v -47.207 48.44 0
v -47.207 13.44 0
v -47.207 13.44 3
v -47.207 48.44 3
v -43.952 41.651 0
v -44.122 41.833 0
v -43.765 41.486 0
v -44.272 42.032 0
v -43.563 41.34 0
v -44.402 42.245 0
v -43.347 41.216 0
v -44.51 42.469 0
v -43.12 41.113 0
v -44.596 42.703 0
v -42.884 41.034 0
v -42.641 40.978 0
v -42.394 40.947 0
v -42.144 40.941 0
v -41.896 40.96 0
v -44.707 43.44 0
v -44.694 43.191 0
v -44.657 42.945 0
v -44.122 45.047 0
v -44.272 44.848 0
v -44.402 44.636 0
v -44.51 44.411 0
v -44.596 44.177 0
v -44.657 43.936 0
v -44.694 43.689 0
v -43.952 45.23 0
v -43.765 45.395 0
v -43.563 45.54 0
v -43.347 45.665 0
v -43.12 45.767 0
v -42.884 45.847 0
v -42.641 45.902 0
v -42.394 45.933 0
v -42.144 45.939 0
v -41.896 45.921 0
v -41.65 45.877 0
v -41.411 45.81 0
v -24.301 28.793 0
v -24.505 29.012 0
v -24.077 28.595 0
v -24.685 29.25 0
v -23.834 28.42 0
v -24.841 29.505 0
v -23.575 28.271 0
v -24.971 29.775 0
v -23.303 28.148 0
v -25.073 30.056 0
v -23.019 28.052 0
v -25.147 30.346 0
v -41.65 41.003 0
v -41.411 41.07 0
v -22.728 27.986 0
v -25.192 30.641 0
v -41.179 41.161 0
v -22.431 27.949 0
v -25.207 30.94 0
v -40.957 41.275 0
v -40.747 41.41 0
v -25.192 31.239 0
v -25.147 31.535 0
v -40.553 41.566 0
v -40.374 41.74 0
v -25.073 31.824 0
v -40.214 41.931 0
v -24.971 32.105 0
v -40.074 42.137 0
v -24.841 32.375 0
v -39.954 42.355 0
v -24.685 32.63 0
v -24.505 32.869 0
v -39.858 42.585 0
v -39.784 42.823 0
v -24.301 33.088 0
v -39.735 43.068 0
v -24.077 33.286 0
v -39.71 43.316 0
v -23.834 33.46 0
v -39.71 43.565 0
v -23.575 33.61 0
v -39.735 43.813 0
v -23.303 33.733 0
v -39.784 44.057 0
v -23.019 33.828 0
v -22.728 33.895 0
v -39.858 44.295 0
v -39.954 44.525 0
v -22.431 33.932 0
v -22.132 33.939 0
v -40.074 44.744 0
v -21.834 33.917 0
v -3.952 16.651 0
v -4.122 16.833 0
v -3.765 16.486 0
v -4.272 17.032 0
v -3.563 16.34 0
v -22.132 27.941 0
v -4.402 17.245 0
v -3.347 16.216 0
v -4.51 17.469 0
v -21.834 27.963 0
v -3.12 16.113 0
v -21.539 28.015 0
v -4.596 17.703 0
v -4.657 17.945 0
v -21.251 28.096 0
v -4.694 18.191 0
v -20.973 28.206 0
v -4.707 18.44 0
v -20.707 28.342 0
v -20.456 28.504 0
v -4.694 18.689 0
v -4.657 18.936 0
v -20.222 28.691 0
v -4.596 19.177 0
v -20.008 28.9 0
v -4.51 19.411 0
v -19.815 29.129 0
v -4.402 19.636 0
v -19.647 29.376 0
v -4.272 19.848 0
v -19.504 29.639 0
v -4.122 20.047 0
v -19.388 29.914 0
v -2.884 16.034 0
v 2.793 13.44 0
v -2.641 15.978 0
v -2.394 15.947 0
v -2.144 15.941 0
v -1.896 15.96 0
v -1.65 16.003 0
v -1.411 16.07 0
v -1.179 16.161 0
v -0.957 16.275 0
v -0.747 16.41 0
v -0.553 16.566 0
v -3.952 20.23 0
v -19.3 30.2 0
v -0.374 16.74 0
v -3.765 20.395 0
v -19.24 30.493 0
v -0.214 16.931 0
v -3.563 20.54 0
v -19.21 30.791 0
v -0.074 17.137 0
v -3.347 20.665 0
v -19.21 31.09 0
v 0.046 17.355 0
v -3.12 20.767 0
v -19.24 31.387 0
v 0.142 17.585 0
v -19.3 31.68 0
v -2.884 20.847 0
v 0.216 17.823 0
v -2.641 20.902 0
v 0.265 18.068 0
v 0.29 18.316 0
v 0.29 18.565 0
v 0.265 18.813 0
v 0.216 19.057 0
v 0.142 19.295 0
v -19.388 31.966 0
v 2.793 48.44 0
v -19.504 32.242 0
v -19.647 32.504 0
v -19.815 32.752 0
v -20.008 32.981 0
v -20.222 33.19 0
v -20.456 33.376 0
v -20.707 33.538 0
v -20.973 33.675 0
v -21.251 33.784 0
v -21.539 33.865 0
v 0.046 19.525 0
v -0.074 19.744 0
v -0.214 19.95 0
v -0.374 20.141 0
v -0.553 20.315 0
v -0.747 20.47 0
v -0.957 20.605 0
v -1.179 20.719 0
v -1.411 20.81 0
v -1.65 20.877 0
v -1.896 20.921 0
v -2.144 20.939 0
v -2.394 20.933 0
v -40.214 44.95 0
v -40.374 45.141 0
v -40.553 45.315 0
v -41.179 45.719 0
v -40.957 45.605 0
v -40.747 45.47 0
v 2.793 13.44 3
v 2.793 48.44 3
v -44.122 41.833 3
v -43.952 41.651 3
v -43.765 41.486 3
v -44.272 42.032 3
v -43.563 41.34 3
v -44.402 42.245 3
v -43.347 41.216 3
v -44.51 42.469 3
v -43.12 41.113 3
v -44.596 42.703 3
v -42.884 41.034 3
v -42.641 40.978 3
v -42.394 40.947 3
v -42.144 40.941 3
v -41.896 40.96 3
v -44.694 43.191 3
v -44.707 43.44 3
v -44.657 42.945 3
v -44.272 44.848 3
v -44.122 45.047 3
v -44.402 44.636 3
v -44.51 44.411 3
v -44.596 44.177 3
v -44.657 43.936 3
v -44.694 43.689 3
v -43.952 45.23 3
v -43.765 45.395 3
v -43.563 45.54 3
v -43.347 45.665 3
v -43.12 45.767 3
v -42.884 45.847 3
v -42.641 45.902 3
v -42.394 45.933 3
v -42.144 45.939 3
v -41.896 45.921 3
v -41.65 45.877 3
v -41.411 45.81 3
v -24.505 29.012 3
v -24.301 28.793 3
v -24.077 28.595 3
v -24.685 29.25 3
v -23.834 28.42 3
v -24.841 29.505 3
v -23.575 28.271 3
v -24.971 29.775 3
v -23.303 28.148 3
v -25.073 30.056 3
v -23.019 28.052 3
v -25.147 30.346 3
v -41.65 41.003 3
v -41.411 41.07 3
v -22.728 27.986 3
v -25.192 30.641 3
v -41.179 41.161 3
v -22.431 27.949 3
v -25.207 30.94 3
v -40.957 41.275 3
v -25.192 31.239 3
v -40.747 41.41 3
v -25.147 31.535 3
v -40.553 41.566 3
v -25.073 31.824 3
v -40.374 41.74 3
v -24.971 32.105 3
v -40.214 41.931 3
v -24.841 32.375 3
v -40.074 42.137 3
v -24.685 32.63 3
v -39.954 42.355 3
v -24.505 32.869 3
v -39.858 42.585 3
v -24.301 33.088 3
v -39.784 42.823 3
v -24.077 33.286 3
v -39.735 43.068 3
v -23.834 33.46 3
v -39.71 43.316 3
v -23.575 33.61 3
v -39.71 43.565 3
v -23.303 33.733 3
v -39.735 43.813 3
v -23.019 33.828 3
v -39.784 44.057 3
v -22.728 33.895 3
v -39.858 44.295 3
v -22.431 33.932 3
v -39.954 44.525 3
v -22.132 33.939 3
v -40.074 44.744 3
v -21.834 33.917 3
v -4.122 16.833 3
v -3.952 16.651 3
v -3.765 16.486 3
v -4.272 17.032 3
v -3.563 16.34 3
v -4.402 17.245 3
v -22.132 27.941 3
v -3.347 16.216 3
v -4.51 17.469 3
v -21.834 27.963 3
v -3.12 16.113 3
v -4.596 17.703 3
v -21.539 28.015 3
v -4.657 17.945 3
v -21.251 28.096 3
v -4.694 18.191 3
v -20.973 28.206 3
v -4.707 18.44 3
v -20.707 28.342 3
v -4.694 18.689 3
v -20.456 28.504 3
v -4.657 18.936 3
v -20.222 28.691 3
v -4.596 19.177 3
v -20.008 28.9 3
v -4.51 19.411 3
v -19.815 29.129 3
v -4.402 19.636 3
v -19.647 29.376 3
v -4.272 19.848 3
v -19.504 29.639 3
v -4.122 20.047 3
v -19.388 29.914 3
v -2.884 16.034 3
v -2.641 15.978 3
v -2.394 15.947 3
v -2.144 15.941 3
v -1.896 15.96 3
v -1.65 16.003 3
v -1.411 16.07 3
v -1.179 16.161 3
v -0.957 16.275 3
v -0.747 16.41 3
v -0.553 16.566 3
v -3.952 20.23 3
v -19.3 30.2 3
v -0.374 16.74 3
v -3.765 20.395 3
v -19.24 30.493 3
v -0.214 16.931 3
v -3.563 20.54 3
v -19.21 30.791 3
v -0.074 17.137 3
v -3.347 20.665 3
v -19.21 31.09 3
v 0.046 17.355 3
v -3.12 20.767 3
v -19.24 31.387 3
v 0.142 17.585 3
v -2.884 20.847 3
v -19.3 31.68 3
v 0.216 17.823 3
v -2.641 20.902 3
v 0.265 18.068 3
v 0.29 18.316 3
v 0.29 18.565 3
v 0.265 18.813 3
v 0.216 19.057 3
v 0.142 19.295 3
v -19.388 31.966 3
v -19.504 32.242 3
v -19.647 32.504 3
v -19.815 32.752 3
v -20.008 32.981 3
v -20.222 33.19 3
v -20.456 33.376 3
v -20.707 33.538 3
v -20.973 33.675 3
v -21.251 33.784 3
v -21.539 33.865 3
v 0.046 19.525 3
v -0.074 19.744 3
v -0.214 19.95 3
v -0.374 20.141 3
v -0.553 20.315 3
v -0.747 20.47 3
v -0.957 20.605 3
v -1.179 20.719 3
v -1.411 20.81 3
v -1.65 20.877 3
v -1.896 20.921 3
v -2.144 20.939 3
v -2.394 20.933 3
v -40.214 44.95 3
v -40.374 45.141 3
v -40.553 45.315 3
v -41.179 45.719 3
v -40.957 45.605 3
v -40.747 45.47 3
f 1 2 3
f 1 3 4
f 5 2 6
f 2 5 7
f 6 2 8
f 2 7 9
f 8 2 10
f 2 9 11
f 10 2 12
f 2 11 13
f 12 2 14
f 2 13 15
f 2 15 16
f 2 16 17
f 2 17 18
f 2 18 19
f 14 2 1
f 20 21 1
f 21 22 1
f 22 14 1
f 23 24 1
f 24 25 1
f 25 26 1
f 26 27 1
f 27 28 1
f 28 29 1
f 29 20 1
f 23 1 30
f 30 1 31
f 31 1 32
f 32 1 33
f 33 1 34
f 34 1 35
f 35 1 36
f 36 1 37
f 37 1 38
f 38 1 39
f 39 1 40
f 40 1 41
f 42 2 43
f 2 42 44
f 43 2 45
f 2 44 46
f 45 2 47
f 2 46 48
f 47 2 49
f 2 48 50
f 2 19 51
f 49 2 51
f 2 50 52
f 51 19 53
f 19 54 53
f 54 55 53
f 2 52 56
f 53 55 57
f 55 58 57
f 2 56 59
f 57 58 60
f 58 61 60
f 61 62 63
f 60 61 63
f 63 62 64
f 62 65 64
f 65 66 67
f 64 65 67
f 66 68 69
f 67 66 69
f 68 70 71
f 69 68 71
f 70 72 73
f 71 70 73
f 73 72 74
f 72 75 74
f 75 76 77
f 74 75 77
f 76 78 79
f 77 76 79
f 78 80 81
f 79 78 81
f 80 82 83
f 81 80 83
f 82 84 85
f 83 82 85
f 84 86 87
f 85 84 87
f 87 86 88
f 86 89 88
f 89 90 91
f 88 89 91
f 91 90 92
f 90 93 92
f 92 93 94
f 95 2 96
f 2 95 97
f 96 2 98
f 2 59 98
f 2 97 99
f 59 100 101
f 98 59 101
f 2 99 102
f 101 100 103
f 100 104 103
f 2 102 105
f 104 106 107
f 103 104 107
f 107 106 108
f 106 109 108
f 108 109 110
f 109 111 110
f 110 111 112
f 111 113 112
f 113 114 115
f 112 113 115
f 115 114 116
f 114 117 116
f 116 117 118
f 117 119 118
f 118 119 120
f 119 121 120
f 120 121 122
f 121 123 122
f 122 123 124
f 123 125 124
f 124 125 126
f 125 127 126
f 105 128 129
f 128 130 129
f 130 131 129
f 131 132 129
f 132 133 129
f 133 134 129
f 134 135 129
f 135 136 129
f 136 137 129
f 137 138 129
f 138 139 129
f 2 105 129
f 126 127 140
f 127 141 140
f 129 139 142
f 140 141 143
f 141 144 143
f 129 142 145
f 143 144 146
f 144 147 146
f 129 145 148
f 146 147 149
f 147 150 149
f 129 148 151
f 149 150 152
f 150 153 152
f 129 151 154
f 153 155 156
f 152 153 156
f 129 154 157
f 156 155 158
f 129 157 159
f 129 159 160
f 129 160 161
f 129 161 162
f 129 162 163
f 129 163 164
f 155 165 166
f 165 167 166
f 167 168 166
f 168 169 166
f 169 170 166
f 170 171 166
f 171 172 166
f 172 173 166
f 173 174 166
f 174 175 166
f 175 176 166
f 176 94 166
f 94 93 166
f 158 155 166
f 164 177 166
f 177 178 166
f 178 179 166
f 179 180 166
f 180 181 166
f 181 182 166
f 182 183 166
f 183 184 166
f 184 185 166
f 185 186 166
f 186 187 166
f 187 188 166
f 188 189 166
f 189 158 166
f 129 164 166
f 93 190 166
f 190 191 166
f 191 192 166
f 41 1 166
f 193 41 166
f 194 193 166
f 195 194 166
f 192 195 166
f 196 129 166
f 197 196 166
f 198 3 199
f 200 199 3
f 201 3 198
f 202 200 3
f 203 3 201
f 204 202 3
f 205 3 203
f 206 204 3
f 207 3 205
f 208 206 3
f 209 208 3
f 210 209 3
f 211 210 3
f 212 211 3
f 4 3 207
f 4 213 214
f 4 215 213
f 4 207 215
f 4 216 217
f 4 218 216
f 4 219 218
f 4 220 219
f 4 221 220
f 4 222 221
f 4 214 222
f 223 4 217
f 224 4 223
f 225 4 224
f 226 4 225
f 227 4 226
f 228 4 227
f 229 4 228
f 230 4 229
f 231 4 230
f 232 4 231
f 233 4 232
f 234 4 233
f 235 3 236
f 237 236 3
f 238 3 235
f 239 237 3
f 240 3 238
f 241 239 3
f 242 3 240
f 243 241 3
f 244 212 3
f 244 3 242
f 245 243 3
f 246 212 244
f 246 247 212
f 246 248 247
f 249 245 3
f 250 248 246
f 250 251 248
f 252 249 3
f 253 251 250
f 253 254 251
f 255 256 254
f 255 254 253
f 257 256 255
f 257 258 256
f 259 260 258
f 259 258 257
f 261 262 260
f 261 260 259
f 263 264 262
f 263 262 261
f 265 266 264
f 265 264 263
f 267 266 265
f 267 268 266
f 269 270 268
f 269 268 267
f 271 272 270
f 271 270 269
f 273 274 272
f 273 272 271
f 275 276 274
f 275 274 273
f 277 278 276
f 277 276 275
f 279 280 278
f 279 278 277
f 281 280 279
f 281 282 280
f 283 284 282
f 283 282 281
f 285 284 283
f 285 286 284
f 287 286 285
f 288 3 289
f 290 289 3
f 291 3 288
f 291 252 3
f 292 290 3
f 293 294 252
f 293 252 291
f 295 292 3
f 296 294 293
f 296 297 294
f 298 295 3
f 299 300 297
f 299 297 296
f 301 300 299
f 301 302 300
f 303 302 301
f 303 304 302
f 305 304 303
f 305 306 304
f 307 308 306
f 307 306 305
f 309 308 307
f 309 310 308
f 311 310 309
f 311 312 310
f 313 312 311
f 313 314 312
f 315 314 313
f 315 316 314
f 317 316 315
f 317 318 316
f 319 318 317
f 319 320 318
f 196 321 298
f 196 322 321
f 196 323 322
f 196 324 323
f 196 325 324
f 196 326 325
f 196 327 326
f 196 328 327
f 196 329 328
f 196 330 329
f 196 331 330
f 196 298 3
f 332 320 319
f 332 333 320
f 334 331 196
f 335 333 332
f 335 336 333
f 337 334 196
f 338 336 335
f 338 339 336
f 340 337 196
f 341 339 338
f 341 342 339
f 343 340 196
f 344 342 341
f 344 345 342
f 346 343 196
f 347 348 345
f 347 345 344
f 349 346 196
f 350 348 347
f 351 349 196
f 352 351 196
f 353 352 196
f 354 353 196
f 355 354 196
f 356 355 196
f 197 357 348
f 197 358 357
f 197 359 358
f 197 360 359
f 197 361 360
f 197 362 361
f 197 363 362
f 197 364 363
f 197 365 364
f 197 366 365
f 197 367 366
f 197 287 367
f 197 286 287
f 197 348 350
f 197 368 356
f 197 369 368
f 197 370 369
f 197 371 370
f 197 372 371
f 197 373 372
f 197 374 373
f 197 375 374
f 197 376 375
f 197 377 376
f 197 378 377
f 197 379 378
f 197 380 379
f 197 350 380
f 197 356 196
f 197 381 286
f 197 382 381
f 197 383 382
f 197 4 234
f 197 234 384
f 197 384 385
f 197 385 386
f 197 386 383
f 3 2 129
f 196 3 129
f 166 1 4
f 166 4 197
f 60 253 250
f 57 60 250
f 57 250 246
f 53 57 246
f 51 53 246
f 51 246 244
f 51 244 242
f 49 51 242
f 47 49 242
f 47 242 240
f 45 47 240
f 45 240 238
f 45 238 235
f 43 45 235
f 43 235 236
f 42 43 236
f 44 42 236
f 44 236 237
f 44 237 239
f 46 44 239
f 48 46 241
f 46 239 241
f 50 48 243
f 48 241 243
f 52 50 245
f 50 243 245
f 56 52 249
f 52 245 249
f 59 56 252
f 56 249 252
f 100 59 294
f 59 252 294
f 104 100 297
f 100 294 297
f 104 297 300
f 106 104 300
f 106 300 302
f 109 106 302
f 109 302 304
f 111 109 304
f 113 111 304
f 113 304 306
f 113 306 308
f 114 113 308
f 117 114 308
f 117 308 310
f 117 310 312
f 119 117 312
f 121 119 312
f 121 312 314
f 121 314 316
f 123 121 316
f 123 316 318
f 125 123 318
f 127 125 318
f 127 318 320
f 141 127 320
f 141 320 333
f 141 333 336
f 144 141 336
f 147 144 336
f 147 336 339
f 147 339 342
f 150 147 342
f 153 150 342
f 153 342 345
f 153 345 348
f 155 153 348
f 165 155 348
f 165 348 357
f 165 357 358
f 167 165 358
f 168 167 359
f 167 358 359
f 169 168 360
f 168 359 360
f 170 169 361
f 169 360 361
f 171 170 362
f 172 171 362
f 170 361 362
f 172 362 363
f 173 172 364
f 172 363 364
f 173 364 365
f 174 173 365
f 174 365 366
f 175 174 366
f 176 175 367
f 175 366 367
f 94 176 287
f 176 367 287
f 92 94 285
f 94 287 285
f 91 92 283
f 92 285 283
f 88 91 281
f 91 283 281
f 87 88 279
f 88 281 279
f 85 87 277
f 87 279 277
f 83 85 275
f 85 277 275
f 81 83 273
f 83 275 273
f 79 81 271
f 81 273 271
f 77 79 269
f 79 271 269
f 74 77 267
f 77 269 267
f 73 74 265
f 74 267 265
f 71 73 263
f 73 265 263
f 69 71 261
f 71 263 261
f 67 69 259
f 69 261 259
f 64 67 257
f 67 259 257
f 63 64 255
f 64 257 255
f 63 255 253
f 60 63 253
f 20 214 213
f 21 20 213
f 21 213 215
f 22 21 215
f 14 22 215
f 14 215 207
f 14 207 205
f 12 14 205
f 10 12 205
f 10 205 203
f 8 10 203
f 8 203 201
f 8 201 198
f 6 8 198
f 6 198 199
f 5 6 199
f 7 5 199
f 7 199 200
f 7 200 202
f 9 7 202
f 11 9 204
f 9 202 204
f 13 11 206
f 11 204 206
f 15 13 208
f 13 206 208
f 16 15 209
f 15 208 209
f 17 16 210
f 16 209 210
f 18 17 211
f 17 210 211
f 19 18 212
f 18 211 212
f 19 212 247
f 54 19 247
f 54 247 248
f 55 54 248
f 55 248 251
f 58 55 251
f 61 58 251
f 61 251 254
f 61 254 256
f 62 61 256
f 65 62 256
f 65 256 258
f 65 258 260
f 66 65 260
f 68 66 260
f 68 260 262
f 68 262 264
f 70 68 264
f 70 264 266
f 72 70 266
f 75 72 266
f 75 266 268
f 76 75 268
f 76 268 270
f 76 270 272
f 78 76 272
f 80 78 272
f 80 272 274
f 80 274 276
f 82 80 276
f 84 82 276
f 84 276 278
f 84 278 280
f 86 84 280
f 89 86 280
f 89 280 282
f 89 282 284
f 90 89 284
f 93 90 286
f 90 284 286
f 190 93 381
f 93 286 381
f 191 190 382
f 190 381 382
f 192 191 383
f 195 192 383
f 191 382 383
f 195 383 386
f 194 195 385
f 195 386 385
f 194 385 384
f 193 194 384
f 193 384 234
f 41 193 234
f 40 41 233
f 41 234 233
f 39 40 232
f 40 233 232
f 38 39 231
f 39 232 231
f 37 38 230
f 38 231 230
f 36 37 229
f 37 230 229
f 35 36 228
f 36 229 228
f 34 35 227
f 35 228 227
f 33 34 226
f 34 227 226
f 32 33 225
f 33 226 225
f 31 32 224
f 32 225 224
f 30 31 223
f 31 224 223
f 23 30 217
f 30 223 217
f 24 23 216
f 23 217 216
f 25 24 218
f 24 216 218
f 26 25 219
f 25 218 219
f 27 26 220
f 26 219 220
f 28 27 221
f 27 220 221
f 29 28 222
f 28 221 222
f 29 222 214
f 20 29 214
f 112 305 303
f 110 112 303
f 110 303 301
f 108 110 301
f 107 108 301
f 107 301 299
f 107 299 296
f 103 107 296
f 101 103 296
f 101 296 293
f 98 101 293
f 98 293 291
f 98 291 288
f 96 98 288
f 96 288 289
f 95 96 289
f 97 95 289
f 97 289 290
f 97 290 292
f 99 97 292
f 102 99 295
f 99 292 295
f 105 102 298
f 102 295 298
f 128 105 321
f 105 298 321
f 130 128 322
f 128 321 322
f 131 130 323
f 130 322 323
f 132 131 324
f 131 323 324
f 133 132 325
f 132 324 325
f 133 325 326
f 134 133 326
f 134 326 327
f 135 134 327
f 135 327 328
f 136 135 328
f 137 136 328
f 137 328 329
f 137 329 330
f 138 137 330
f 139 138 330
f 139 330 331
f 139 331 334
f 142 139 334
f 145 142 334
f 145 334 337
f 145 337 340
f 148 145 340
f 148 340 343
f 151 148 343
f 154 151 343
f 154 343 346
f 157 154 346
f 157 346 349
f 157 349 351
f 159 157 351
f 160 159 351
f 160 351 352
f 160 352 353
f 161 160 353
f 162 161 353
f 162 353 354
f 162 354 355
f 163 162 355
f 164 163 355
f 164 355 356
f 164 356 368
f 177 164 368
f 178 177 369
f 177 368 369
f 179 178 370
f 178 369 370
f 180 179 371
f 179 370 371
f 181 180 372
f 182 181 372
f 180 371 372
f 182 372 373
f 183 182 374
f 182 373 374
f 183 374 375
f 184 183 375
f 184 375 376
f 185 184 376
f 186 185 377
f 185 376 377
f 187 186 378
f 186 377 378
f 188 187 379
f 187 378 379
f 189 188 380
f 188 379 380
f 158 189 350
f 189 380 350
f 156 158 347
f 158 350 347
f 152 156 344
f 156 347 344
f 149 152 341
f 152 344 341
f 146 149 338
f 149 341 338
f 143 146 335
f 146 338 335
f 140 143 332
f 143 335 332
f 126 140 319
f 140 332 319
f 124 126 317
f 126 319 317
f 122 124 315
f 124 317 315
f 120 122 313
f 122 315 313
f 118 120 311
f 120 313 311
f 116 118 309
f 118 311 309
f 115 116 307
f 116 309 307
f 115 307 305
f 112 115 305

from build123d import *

# Parameters (mm, degrees)
F0_W     = 50
F0_H     = 35
F1_DEPTH = 3
F2_D     = 6
F3_D     = 5
F4_D     = 5


with BuildPart() as f1:
    # F0 (on Top) → F1 (new body)
    with BuildSketch(Plane.XY):
        with Locations((-22.2067534924, 30.9401798017)):
            Rectangle(F0_W, F0_H)
    extrude(amount=F1_DEPTH)

    # F2 (through all)
    with Locations(Plane(origin=(0, 0, 0), x_dir=(1, 0, 0), z_dir=(0, 0, -1))):
        with Locations((-22.2067534924, -30.9401798017)):
            Hole(F2_D / 2)

    # F3 (through all)
    with Locations(Plane(origin=(0, 0, 0), x_dir=(1, 0, 0), z_dir=(0, 0, -1))):
        with Locations((-2.2067534924, -18.4401798017)):
            Hole(F3_D / 2)

    # F4 (through all)
    with Locations(Plane(origin=(0, 0, 0), x_dir=(1, 0, 0), z_dir=(0, 0, -1))):
        with Locations((-42.2067534924, -43.4401798017)):
            Hole(F4_D / 2)


solid = f1.part
